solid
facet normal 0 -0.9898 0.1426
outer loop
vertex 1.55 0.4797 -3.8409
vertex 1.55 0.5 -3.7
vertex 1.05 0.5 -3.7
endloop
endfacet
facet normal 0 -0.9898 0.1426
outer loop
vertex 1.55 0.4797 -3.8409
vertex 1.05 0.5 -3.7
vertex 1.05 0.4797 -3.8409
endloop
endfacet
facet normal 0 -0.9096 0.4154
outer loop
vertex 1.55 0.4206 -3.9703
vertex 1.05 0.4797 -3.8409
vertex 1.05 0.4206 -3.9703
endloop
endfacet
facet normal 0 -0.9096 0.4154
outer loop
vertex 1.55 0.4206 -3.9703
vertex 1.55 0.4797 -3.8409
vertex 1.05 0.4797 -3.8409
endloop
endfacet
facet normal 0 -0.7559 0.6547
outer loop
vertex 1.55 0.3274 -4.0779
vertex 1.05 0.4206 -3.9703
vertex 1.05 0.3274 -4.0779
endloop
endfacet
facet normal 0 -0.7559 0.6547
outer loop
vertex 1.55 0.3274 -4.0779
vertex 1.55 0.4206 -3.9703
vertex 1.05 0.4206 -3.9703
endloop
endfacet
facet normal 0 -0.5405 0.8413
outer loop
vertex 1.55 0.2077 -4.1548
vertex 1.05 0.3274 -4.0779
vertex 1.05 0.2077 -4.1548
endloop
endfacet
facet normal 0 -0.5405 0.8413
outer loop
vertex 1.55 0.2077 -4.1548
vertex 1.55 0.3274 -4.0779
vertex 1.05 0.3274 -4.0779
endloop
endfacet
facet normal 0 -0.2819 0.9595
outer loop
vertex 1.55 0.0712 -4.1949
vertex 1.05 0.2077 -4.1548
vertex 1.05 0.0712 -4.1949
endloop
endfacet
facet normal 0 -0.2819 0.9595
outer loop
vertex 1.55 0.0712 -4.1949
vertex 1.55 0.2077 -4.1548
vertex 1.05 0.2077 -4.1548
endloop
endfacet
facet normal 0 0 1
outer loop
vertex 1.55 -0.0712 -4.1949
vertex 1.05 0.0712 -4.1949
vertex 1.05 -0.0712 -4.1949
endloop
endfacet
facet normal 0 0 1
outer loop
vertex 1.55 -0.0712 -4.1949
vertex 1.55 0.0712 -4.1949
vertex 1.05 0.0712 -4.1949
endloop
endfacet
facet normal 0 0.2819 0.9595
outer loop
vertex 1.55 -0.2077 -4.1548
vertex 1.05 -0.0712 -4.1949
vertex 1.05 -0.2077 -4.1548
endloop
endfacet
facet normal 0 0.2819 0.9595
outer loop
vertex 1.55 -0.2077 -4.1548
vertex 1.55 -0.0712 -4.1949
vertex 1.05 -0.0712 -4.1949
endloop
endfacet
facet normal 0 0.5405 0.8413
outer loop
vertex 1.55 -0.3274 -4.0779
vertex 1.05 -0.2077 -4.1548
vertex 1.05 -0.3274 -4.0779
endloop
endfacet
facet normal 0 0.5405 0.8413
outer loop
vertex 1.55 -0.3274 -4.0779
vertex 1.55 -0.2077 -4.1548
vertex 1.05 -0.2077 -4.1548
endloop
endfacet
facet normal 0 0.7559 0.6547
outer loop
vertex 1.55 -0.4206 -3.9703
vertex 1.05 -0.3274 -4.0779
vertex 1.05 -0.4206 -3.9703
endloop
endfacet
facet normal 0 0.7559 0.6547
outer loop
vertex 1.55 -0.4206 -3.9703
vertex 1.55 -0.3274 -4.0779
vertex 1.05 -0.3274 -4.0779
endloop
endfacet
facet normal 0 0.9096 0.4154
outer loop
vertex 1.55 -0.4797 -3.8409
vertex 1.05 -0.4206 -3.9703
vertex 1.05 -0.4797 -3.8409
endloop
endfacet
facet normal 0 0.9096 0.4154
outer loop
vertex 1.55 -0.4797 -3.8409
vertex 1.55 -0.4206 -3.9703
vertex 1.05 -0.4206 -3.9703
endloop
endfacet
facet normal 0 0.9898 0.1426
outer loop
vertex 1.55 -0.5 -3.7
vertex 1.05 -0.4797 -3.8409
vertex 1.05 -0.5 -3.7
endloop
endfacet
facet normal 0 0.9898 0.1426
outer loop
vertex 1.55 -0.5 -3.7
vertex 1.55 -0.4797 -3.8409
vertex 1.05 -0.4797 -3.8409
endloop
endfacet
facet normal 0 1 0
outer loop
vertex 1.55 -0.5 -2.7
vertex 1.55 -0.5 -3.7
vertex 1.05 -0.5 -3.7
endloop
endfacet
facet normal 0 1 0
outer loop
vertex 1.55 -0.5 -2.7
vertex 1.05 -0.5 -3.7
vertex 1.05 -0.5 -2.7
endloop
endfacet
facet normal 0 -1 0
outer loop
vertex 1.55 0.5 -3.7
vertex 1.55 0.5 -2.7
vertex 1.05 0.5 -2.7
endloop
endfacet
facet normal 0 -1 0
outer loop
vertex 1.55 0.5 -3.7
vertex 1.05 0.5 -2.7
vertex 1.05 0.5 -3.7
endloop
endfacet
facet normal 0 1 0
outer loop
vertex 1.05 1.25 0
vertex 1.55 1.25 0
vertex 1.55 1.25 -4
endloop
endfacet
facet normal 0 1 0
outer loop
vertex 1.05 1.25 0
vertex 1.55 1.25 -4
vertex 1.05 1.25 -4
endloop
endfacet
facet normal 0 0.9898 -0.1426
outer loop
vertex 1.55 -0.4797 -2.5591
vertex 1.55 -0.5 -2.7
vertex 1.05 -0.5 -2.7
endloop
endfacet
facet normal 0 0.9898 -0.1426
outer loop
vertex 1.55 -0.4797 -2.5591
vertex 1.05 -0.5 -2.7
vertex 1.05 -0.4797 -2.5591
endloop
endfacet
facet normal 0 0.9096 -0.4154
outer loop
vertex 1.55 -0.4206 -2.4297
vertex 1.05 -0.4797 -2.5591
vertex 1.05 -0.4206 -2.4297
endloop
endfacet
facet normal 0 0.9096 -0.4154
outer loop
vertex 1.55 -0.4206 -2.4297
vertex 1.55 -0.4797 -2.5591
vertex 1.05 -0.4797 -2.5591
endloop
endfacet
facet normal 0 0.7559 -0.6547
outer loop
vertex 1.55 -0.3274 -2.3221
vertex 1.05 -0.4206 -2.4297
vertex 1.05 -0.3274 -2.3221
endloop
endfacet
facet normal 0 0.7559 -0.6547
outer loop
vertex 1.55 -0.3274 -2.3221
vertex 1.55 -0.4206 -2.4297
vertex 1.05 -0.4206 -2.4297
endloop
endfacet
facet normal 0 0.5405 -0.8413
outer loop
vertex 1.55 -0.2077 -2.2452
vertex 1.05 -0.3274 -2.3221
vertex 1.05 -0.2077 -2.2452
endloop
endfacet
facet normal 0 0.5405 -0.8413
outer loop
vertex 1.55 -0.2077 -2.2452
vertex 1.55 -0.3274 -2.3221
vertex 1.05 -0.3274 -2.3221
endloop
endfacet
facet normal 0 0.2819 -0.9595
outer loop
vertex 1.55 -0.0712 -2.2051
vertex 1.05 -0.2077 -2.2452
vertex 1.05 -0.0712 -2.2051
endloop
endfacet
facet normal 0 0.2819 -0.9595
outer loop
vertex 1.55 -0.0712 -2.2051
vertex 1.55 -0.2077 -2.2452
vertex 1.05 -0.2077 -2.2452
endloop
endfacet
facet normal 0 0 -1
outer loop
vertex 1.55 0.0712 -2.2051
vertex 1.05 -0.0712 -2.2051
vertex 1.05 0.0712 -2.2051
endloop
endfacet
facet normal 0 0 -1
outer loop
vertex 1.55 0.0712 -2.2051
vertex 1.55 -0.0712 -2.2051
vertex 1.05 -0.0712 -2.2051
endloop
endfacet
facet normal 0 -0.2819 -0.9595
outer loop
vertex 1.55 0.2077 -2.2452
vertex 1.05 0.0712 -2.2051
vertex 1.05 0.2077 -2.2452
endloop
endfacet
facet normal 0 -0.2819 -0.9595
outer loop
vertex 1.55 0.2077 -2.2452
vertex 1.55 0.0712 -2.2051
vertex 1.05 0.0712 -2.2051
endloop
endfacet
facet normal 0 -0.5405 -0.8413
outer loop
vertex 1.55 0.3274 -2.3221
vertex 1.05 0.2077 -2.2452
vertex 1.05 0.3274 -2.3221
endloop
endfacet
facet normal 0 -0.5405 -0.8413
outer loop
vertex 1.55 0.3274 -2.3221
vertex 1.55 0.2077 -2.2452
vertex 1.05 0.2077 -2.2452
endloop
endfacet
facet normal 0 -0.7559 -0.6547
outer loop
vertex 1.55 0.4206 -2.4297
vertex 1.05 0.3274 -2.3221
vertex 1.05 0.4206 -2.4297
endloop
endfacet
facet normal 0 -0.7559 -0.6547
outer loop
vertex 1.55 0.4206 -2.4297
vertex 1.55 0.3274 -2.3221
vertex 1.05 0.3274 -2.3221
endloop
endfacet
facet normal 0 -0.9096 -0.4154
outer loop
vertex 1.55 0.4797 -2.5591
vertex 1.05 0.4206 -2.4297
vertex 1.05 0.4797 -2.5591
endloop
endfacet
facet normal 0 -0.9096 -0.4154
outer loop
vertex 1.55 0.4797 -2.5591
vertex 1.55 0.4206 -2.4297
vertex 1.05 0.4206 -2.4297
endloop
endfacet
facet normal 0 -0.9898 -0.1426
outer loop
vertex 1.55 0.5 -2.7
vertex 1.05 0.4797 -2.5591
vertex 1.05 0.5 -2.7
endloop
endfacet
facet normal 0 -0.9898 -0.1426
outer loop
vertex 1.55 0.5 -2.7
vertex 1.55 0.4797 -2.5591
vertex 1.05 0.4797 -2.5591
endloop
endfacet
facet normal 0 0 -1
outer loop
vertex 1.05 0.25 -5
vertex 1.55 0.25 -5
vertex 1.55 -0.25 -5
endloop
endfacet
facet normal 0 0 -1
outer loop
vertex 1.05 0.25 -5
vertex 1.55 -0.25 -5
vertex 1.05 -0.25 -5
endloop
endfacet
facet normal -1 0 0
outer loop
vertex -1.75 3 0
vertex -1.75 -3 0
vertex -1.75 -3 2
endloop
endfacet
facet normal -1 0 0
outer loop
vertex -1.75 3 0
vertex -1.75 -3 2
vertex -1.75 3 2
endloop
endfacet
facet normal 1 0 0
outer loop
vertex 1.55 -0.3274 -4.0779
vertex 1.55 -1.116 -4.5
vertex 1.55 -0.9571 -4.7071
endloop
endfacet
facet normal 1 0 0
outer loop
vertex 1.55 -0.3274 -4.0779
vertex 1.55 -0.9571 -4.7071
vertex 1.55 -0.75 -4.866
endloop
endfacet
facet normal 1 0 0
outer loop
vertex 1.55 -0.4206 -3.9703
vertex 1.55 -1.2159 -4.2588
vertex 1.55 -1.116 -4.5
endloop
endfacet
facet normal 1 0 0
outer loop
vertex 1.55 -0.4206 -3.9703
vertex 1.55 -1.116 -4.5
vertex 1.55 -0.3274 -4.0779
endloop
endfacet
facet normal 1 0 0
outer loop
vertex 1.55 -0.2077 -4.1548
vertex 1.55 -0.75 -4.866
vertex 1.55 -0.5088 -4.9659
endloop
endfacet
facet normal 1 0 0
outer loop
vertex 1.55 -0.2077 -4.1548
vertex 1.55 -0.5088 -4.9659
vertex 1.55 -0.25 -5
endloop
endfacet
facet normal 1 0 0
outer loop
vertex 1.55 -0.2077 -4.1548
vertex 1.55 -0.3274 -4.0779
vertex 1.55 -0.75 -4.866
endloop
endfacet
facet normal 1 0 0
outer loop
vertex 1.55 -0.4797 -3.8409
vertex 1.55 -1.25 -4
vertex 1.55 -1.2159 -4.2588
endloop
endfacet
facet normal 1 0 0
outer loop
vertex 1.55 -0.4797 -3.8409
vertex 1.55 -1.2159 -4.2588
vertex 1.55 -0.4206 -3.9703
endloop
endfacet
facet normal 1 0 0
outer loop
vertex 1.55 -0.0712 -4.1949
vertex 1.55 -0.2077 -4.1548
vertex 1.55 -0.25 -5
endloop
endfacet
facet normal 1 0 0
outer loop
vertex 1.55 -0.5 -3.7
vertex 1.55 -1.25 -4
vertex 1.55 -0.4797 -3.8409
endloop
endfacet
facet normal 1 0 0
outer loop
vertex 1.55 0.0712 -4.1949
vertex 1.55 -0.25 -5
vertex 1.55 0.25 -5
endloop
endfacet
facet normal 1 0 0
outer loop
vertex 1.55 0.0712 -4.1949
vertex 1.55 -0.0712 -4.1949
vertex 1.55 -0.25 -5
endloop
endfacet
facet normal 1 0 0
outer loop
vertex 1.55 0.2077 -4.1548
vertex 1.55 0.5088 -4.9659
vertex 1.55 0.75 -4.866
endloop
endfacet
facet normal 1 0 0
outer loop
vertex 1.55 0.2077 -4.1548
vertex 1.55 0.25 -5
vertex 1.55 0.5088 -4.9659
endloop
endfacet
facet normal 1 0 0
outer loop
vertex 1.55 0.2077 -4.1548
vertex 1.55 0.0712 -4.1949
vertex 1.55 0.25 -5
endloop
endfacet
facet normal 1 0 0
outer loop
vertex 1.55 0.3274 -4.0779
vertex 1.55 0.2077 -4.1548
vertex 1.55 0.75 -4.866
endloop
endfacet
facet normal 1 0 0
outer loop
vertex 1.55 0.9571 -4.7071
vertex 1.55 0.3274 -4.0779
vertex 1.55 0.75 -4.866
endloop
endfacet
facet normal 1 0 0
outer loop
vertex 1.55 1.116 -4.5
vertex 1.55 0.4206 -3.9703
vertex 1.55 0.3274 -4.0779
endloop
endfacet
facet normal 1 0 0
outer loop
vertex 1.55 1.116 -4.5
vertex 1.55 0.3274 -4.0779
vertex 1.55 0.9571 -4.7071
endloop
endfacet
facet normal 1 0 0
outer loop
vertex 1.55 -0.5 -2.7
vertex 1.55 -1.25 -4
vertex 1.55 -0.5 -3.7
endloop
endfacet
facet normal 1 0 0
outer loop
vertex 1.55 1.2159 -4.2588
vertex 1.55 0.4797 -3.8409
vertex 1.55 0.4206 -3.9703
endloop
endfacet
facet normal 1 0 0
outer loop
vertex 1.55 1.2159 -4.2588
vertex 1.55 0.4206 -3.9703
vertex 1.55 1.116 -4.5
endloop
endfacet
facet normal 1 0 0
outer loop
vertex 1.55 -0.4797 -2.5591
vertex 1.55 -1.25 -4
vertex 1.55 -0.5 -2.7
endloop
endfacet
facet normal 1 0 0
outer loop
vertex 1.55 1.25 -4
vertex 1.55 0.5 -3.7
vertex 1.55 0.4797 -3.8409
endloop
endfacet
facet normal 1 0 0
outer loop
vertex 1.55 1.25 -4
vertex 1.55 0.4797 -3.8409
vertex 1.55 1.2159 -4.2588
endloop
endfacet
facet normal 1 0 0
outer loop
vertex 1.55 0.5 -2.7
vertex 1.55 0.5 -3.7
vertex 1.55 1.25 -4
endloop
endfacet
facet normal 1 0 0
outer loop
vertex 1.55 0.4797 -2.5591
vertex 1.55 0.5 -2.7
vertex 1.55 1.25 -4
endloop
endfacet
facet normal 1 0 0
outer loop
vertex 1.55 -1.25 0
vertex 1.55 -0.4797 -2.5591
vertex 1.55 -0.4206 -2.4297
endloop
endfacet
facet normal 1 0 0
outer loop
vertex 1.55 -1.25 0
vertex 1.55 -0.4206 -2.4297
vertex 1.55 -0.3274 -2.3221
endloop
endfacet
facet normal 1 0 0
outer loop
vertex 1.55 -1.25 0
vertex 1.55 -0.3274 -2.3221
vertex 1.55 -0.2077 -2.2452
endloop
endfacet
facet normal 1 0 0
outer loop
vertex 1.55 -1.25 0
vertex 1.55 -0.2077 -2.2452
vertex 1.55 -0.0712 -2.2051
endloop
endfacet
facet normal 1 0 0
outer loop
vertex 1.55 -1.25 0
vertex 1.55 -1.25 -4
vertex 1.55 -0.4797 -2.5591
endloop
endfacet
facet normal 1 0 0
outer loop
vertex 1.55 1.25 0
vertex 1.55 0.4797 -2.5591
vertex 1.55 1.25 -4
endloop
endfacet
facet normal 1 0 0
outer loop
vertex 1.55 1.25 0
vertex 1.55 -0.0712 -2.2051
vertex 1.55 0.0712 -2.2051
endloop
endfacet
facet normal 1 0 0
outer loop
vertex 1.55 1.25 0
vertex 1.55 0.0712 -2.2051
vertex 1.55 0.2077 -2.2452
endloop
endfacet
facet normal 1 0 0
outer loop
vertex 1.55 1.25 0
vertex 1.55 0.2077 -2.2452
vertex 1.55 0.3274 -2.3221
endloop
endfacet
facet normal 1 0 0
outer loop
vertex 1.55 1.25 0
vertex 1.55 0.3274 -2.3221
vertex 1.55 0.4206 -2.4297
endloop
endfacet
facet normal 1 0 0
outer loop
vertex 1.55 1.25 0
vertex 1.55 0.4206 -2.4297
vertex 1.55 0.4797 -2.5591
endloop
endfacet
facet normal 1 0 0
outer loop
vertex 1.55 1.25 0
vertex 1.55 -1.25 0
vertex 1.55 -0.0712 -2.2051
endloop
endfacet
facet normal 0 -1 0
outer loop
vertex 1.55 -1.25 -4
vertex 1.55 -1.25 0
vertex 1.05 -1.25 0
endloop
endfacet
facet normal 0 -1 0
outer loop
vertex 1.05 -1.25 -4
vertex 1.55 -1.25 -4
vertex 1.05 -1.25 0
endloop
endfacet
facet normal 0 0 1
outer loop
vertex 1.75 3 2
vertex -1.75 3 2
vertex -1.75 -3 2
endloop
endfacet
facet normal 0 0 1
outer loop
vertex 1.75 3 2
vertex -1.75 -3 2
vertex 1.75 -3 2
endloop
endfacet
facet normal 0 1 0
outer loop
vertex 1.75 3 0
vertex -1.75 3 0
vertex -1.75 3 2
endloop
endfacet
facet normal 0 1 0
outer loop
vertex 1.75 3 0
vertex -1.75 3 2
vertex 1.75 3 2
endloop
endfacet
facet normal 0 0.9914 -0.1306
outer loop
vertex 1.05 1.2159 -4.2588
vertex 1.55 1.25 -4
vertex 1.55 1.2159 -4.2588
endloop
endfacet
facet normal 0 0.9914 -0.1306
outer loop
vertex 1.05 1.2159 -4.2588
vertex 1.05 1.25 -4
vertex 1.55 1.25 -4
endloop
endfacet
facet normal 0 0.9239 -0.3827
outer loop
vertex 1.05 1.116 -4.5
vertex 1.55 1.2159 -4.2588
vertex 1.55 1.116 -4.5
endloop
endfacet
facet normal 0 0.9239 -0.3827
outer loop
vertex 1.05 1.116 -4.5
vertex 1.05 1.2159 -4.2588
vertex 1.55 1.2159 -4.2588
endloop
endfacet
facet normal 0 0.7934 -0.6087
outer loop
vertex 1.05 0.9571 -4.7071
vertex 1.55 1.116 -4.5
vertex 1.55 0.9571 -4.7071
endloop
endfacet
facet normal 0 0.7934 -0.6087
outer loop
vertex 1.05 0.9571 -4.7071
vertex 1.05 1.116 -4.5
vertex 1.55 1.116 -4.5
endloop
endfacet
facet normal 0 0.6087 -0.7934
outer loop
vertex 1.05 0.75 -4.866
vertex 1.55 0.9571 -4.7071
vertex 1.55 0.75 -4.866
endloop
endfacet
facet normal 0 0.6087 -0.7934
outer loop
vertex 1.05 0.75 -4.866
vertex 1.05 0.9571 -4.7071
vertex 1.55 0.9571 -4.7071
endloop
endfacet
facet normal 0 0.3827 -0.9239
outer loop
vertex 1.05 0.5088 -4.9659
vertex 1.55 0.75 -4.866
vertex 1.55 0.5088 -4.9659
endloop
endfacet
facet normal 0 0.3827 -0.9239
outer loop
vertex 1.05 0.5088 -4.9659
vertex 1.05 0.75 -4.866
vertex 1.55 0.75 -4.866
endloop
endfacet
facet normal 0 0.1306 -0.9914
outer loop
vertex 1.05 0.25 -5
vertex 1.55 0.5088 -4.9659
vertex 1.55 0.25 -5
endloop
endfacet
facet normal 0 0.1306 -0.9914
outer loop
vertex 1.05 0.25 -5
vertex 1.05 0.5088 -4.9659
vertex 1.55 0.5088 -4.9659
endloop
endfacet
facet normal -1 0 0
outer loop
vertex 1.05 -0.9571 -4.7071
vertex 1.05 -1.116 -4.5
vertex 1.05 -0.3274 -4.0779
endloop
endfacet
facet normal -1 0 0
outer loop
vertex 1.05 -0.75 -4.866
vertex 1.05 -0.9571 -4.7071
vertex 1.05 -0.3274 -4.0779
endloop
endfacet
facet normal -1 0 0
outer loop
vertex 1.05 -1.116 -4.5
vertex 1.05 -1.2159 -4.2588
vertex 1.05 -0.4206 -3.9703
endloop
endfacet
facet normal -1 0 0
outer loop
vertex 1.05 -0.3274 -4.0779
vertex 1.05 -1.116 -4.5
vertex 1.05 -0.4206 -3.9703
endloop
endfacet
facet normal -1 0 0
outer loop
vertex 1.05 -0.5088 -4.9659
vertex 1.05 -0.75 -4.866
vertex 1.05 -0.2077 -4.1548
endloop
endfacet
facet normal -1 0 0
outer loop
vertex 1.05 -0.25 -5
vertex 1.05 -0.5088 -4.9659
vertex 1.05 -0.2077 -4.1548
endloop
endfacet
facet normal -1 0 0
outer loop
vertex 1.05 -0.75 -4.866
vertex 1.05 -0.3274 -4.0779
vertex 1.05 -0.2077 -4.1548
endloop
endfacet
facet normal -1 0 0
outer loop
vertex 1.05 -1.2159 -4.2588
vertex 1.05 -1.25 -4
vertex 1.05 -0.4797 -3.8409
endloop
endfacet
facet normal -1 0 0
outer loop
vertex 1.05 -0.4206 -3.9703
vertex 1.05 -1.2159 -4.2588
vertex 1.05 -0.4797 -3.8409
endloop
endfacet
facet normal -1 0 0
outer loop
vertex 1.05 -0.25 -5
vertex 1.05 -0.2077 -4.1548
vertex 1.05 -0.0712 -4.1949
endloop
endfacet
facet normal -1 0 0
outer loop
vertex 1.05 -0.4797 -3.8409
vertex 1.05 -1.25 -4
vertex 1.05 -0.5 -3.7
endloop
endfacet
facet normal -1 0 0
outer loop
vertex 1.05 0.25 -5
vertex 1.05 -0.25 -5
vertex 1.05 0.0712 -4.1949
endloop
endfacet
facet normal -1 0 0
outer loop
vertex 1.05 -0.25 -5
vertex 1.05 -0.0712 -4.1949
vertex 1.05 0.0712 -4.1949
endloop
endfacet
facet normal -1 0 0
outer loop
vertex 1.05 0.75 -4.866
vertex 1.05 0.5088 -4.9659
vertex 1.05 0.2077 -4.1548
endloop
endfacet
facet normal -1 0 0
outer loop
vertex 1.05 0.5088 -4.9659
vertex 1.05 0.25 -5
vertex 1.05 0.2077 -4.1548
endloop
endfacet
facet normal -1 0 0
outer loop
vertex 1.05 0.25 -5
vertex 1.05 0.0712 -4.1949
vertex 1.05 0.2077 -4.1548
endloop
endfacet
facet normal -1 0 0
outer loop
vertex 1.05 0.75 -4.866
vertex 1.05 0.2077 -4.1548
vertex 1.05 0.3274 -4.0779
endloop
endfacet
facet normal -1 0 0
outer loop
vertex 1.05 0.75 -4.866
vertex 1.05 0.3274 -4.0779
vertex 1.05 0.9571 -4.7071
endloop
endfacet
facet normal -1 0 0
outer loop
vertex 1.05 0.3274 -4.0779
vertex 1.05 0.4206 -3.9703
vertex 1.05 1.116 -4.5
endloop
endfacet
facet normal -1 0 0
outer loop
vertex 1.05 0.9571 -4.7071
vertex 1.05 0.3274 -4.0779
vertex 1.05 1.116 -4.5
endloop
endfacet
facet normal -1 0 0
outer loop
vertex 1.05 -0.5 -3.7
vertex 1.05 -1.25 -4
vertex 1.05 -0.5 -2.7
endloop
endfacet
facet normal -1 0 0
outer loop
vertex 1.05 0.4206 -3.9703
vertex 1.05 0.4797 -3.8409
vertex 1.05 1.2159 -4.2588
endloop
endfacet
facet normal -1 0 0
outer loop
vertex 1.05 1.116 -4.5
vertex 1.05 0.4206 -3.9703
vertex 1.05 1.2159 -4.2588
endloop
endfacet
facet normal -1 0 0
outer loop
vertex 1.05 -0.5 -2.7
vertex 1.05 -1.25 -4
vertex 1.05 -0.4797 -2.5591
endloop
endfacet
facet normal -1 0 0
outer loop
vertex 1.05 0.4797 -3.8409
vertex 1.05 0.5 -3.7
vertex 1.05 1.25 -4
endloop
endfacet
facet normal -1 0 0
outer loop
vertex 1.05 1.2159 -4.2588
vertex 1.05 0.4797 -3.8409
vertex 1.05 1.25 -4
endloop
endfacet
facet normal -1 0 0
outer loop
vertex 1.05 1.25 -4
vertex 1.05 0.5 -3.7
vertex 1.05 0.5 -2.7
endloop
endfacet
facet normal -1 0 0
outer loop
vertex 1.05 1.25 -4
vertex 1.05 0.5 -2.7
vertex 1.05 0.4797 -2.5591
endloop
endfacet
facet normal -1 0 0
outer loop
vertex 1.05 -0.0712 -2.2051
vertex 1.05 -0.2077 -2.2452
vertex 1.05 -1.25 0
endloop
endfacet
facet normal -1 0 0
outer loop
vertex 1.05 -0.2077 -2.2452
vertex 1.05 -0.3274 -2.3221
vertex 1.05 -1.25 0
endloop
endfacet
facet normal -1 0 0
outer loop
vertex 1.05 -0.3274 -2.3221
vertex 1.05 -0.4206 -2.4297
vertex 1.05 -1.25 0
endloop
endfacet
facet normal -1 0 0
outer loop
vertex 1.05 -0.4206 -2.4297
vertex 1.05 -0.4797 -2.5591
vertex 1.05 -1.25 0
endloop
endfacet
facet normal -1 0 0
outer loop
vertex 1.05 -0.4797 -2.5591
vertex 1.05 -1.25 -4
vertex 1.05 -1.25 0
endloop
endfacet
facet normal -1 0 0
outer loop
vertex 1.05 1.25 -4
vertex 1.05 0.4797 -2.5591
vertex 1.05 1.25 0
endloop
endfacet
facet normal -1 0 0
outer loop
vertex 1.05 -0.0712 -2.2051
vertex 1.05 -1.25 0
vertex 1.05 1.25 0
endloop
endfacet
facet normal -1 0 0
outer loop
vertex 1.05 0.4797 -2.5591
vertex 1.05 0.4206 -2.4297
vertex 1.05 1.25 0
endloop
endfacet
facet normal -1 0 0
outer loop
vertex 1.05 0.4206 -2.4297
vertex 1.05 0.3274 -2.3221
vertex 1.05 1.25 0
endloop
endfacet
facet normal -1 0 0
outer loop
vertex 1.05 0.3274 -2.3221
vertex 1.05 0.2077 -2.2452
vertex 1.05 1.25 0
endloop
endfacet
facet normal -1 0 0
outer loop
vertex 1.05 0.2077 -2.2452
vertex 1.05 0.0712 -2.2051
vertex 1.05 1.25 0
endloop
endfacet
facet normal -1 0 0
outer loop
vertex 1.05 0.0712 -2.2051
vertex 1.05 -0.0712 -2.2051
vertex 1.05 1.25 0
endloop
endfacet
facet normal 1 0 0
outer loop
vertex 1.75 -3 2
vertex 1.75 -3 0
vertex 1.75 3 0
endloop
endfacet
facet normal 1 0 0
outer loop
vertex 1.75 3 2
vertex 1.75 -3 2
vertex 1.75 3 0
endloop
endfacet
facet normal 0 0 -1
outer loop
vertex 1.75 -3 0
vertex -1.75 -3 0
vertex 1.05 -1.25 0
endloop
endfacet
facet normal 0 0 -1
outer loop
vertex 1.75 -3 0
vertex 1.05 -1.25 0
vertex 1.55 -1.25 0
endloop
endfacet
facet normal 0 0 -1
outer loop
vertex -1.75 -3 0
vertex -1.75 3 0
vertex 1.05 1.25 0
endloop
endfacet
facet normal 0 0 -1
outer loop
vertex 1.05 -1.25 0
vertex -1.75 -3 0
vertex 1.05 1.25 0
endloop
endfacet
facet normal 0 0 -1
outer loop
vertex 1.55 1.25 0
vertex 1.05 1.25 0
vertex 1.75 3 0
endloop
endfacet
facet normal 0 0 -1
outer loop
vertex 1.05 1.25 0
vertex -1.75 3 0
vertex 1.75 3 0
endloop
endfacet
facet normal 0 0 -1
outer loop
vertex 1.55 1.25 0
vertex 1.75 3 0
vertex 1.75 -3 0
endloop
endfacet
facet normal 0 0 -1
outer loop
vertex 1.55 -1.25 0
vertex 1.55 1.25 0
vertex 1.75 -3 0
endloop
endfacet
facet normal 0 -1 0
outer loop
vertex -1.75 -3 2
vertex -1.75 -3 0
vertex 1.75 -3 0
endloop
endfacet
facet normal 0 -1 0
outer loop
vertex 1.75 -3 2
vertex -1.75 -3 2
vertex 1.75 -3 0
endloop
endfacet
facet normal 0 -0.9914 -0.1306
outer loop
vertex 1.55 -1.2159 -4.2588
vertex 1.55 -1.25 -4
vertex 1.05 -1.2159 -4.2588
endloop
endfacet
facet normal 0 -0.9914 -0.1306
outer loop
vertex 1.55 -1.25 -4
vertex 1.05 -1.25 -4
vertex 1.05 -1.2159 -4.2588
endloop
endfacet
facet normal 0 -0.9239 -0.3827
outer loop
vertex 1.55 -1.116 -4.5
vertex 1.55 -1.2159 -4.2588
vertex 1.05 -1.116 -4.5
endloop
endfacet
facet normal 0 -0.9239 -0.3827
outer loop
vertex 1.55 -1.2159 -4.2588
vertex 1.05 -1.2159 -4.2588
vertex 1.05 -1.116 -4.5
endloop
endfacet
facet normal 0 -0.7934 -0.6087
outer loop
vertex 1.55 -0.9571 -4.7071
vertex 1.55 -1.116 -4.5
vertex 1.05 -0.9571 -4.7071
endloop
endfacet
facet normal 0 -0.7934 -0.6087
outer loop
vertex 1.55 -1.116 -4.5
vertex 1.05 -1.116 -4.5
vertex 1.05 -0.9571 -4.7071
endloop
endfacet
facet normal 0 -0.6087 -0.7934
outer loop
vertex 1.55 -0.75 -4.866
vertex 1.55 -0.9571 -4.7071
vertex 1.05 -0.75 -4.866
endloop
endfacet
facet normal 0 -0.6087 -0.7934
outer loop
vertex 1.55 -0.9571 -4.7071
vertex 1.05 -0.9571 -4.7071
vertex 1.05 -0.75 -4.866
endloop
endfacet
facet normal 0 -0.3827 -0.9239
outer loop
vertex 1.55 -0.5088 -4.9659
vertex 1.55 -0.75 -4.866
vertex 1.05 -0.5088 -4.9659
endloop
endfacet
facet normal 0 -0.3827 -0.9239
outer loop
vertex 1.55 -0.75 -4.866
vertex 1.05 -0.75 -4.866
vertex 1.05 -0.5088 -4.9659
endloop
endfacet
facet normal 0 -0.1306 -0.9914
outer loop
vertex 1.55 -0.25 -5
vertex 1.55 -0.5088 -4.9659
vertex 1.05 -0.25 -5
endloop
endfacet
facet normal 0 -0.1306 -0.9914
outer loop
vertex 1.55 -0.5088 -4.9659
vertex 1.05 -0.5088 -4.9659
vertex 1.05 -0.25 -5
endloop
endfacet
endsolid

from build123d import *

# Parameters (mm, degrees)
SKETCH1_W           = 3.5
SKETCH1_H           = 6
BOSS_EXTRUDE1_DEPTH = 2
SKETCH2_W           = 0.5
SKETCH2_H           = 2.5
BOSS_EXTRUDE2_DEPTH = 5
FILLET1_R           = 1
CUT_EXTRUDE1_DEPTH  = 5


with BuildPart() as part:
    # Sketch1 → Boss-Extrude1 (new body)
    with BuildSketch(Plane.XY):
        Rectangle(SKETCH1_W, SKETCH1_H)
    extrude(amount=BOSS_EXTRUDE1_DEPTH)

    # Sketch2 → Boss-Extrude2 (add)
    with BuildSketch(Plane(origin=(0, 0, 0), x_dir=(-1, 0, 0), z_dir=(0, 0, -1))):
        with Locations((-1.3, 0)):
            Rectangle(SKETCH2_W, SKETCH2_H)
    extrude(amount=BOSS_EXTRUDE2_DEPTH)

    # Fillet1
    fillet1_edges = [part.edges().sort_by_distance(p)[0] for p in [
        (1.3, 1.25, -5),
        (1.3, -1.25, -5),
    ]]
    fillet(fillet1_edges, radius=FILLET1_R)

    # Sketch3 → Cut-Extrude1 (cut)
    with BuildSketch(Plane(origin=(1.55, 0, 0), x_dir=(0, 0, -1), z_dir=(1, 0, 0))):
        with BuildLine():
            Line((2.7, 0.5), (3.7, 0.5))
            ThreePointArc((3.7, 0.5), (4.2, 0), (3.7, -0.5))
            Line((3.7, -0.5), (2.7, -0.5))
            ThreePointArc((2.7, -0.5), (2.2, 0), (2.7, 0.5))
        make_face()
    extrude(amount=-CUT_EXTRUDE1_DEPTH, mode=Mode.SUBTRACT)


solid = part.part
